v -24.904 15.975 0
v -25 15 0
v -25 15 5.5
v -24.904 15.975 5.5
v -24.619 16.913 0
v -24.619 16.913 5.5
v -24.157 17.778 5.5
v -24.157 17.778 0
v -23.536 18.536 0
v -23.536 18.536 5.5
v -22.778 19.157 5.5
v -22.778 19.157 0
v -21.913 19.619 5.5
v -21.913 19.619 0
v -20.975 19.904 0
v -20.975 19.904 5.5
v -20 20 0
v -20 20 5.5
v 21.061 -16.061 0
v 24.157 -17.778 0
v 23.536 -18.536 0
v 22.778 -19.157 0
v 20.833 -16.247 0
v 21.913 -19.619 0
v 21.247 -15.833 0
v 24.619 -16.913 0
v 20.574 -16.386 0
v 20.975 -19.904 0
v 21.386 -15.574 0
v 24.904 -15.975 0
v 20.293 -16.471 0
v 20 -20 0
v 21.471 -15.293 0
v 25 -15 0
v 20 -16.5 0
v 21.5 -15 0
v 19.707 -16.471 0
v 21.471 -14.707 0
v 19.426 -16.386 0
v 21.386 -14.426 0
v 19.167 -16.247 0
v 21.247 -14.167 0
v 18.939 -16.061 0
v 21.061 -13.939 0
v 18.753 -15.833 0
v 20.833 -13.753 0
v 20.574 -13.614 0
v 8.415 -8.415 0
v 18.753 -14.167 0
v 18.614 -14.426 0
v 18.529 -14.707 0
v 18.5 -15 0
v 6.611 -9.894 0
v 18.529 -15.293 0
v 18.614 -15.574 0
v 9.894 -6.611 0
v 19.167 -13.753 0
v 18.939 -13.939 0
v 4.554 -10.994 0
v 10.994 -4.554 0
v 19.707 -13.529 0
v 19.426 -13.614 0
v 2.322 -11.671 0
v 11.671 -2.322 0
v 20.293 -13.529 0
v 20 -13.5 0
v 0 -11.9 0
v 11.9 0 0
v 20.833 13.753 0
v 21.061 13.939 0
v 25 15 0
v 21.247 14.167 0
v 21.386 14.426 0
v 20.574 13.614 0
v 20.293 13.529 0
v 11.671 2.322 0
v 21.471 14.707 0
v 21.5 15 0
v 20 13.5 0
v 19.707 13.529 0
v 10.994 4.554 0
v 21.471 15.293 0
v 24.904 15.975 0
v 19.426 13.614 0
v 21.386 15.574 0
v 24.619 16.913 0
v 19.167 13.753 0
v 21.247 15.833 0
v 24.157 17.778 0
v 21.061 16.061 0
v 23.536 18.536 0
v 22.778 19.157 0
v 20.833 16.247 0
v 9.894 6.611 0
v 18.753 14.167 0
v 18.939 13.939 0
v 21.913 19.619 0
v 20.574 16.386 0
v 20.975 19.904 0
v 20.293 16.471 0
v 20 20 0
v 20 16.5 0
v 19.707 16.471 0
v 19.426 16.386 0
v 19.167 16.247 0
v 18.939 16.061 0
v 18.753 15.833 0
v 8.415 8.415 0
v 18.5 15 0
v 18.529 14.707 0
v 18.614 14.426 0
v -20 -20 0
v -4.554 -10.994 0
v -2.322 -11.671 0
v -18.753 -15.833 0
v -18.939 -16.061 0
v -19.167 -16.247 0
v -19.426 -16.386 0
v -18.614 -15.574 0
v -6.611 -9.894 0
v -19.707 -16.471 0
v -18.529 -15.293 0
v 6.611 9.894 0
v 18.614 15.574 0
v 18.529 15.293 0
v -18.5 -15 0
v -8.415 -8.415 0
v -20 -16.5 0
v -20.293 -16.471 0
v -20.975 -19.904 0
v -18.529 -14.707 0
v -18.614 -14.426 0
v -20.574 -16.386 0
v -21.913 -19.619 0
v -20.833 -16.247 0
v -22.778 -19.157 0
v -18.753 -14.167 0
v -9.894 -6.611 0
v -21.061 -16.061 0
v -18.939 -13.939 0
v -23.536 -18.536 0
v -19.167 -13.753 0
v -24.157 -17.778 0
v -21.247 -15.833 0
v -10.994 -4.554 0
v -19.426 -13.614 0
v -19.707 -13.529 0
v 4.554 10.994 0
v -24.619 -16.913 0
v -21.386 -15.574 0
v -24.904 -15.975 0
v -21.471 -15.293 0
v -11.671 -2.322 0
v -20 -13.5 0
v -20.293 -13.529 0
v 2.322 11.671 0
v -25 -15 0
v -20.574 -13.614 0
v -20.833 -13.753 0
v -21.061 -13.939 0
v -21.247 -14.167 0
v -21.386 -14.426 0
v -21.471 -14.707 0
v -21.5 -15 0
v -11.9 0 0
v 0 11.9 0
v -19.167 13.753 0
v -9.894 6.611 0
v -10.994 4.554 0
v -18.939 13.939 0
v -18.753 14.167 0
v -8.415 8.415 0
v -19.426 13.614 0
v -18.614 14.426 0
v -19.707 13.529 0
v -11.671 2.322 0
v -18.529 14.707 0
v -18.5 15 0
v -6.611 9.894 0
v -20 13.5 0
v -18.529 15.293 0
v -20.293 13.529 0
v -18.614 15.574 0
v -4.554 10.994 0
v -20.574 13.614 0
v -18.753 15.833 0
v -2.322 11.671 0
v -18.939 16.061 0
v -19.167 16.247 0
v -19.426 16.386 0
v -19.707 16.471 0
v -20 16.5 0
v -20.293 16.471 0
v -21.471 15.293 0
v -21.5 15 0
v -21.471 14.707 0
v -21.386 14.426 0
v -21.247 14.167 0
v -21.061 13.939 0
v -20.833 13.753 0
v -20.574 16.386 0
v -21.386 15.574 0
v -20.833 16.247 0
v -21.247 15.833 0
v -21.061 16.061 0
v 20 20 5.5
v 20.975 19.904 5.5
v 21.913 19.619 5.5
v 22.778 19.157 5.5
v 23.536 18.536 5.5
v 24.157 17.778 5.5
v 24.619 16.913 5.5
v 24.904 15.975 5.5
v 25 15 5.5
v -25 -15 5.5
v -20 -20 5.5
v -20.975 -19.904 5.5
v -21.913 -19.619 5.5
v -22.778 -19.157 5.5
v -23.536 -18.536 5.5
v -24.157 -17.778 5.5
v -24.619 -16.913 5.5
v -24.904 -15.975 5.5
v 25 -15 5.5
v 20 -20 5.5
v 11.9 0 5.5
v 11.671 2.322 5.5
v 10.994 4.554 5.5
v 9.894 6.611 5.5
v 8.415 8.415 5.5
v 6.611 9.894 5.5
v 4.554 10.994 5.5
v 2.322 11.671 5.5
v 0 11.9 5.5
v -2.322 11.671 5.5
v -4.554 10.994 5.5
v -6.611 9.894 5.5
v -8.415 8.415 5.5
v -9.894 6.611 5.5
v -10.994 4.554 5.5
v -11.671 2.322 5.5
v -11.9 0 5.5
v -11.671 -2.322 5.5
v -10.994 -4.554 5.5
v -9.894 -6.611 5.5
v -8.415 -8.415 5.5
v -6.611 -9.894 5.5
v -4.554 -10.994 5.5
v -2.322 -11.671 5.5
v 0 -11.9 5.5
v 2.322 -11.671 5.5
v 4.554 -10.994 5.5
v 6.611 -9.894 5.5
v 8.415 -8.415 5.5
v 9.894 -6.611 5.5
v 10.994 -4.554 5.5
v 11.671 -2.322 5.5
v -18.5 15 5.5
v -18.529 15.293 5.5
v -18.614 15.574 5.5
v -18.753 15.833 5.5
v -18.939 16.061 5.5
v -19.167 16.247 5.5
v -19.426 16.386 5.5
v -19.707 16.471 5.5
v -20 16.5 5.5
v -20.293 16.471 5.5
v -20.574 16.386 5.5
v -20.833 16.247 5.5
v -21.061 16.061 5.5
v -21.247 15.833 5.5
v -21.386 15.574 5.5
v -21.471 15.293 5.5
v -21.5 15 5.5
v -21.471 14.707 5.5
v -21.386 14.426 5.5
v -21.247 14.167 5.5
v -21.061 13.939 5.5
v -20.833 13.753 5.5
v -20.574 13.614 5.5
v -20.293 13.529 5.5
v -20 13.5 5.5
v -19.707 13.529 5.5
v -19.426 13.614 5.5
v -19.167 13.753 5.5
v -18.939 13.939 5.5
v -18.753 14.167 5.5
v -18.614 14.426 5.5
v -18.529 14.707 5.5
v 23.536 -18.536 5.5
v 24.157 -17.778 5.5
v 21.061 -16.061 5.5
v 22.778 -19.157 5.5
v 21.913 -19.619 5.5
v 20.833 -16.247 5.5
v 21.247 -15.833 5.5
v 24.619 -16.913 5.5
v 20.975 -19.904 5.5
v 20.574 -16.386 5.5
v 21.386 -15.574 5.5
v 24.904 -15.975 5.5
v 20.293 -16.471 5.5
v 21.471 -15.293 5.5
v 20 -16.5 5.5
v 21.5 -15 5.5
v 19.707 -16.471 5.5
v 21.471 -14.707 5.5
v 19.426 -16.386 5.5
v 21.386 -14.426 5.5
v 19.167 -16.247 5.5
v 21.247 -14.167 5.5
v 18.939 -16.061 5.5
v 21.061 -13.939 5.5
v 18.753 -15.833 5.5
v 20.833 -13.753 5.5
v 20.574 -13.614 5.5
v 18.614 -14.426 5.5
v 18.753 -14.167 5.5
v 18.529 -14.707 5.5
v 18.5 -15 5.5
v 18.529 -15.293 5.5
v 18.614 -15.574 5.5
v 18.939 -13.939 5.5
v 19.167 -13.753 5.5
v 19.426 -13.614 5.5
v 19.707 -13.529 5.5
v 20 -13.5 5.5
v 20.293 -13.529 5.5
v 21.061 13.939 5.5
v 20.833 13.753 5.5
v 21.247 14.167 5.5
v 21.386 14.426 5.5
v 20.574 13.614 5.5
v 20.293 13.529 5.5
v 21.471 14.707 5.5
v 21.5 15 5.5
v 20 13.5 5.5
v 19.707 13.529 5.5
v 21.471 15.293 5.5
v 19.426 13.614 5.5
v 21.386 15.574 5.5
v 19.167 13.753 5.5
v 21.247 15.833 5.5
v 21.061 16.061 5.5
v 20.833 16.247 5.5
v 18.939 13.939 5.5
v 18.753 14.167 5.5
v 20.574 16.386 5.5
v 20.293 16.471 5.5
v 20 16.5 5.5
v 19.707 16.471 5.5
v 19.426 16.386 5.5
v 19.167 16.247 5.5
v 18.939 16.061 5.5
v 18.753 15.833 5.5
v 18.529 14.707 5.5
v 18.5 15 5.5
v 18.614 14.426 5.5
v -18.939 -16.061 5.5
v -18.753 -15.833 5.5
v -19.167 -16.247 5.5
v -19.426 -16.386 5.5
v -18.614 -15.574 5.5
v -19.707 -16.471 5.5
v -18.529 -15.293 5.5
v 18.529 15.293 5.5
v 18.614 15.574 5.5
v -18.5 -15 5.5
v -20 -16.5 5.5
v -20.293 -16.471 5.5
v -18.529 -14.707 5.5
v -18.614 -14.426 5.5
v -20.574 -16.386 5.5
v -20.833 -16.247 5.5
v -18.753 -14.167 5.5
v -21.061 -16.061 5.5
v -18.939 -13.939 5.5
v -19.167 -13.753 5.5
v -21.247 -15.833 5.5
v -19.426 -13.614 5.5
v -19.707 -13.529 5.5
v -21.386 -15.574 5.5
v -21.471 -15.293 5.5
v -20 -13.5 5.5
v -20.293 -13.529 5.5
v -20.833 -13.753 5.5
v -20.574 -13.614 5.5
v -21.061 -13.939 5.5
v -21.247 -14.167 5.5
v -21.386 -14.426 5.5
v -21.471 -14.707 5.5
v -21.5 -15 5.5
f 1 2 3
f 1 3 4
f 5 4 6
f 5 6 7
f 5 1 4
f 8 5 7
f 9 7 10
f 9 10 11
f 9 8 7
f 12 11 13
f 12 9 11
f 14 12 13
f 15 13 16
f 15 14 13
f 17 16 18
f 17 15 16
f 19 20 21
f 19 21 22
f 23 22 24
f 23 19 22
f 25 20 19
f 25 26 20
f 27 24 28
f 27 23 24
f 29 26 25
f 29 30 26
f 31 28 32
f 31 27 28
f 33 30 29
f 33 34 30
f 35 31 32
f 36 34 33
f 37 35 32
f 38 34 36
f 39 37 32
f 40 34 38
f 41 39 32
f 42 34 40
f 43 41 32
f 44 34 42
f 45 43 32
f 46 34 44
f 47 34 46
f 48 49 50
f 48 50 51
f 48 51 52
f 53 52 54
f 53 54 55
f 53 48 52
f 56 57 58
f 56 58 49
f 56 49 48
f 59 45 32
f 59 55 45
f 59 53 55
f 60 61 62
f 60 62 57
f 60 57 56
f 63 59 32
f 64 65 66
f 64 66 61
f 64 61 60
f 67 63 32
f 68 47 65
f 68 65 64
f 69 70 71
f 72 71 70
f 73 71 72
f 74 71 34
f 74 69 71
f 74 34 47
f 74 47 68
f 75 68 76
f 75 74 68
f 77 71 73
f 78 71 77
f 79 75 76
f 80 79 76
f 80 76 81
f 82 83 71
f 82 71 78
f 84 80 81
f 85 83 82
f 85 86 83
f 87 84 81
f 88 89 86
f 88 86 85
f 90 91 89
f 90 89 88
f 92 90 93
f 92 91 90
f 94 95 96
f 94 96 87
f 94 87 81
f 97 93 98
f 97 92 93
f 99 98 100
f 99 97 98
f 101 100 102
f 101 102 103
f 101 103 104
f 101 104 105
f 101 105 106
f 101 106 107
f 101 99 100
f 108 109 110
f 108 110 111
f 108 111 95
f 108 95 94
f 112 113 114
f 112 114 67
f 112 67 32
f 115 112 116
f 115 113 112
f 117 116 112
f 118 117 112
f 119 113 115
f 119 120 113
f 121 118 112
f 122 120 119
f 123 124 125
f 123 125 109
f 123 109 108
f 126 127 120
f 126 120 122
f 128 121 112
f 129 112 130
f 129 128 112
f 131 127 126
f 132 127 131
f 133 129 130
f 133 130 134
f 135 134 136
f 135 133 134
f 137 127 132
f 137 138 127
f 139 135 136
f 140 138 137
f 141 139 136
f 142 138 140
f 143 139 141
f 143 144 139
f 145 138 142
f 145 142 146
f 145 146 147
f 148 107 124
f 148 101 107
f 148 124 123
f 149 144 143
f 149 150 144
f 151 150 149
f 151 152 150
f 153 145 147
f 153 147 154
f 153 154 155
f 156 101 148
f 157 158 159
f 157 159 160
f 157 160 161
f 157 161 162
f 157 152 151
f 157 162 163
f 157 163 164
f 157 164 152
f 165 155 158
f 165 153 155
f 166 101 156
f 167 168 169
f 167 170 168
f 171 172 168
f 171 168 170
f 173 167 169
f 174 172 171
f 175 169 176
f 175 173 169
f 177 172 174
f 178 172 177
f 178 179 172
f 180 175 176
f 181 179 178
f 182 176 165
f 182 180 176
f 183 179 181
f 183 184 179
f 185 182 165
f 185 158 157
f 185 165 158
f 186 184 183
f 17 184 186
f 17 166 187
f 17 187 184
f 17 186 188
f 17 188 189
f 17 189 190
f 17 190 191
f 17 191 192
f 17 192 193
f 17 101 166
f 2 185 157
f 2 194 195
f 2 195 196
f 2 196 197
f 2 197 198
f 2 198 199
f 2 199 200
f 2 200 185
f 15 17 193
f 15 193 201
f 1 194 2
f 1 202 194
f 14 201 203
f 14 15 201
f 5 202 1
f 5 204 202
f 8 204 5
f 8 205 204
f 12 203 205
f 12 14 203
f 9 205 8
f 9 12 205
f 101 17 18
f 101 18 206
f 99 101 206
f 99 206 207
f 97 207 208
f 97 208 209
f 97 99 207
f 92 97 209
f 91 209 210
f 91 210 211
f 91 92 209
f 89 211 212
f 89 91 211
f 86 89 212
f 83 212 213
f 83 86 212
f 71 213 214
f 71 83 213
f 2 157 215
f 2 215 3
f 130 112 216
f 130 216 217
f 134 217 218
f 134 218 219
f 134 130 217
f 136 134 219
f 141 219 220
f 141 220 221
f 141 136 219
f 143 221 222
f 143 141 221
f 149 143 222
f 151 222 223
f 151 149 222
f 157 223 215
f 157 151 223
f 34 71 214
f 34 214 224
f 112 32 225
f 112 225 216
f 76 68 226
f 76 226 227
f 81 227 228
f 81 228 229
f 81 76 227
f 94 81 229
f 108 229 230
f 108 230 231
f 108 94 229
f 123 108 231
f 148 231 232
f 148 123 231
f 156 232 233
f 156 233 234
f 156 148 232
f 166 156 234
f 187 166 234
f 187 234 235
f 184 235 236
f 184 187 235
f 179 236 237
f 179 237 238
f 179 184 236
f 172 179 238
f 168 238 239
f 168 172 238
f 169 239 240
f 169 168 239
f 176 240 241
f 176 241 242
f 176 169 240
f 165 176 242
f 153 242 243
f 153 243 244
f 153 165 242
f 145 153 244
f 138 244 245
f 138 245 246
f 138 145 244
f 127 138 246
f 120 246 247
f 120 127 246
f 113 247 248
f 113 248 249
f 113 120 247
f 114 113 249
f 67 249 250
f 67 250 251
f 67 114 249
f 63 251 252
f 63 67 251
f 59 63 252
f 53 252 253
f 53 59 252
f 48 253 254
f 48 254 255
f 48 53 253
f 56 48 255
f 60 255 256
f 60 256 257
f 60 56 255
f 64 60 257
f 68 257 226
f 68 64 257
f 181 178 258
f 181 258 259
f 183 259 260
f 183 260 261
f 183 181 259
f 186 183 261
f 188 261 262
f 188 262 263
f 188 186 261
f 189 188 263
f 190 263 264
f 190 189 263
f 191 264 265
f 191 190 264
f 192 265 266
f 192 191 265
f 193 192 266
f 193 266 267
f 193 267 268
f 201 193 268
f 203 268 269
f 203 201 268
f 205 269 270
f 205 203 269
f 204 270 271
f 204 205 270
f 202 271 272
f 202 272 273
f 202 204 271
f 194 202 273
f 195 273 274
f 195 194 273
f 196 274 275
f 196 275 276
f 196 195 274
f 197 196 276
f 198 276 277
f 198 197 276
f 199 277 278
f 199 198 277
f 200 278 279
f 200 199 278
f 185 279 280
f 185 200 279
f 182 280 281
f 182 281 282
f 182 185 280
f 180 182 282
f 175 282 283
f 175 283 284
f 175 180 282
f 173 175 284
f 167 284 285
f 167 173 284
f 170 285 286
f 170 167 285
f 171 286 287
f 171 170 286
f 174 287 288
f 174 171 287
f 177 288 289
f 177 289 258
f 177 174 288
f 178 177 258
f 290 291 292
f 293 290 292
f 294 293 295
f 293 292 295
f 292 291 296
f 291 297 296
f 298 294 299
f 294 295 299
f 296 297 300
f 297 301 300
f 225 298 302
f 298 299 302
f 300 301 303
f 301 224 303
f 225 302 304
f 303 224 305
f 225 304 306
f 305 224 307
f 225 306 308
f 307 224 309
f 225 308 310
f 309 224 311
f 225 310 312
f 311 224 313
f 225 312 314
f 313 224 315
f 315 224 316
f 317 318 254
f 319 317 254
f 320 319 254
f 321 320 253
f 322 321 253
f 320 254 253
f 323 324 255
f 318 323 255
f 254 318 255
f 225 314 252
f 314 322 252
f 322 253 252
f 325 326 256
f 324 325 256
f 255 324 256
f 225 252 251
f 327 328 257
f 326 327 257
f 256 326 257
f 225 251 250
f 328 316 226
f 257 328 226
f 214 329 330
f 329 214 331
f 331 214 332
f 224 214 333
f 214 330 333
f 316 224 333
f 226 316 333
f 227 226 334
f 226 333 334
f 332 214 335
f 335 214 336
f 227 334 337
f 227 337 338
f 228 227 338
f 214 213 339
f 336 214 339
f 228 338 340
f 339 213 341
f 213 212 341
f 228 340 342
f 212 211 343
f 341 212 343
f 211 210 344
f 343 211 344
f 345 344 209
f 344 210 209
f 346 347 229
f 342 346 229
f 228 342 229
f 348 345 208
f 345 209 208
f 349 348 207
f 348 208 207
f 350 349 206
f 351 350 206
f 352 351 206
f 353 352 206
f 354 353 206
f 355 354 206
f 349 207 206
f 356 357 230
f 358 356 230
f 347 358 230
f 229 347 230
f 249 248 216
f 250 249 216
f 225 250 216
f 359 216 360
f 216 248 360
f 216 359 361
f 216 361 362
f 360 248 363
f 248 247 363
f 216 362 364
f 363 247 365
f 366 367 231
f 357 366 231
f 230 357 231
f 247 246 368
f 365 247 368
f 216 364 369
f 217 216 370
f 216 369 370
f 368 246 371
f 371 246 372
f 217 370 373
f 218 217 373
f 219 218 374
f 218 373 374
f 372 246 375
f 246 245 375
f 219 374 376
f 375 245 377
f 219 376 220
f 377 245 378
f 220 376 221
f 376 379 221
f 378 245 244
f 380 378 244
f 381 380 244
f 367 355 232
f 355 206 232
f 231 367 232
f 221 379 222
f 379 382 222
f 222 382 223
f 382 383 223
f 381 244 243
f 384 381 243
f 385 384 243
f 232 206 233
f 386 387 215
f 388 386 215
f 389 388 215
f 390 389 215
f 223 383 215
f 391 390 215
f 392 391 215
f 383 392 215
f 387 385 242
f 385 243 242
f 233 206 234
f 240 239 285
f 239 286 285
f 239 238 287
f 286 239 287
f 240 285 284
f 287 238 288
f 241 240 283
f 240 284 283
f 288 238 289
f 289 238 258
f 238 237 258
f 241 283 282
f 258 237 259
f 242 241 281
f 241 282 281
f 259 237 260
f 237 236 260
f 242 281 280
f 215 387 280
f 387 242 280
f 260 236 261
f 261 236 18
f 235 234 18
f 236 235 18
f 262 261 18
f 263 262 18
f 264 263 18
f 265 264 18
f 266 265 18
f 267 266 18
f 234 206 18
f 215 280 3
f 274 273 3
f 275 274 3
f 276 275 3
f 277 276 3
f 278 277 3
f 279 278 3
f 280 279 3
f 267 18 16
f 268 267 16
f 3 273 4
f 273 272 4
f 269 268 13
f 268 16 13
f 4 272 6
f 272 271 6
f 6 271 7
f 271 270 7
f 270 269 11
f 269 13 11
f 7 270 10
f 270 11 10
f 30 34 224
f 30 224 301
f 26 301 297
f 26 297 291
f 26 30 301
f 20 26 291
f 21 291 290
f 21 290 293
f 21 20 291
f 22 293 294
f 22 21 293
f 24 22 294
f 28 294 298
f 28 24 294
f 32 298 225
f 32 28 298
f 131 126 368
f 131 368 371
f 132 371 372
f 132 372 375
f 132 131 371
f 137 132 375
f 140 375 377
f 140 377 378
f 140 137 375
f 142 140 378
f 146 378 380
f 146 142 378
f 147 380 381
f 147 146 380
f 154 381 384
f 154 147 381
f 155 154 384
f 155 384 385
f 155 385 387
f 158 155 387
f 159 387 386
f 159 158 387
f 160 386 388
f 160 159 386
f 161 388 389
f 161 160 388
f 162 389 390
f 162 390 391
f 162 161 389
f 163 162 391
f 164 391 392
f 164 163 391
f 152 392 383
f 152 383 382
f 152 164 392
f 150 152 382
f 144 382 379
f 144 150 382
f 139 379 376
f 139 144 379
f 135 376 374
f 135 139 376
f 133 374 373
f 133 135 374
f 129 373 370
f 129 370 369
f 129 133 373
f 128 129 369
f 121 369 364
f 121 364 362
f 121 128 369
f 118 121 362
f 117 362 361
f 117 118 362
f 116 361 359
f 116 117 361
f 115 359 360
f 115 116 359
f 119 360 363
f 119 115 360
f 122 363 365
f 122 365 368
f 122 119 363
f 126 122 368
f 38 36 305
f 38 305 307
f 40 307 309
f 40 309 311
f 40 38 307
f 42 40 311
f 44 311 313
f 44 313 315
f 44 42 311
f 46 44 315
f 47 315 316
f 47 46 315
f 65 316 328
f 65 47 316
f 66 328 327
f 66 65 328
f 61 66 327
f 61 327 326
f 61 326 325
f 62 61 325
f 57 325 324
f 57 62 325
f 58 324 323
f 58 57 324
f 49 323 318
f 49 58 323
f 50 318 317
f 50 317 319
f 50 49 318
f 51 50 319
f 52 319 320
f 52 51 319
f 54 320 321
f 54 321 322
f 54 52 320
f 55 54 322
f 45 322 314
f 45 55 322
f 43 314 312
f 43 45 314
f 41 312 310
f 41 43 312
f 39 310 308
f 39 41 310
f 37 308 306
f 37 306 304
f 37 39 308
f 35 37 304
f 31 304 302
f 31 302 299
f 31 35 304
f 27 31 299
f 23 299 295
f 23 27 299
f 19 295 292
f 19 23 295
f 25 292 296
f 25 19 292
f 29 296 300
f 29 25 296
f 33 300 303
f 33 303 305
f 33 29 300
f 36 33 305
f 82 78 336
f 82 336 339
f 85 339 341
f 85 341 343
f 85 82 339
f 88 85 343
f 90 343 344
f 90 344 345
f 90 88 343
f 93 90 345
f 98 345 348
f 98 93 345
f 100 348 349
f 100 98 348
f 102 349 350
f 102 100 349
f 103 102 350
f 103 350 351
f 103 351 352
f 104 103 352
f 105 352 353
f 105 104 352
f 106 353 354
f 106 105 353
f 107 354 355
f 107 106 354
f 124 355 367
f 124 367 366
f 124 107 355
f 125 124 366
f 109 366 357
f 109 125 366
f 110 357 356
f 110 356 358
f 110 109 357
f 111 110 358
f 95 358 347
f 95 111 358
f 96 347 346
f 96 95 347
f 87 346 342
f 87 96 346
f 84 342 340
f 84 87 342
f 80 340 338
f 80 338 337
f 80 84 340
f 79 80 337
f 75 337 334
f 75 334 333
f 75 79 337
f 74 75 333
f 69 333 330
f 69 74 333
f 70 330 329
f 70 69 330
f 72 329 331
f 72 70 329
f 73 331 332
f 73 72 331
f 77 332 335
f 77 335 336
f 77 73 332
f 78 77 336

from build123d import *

# Parameters (mm, degrees)
CROQUIS1_R              = 1.5
CROQUIS1_R_2            = 11.9
SALIENTE_EXTRUIR1_DEPTH = 5.5


with BuildPart() as part:
    # Croquis1 → Saliente-Extruir1 (new body)
    with BuildSketch(Plane.XY):
        with BuildLine():
            Line((-20, 20), (20, 20))
            ThreePointArc((20, 20), (23.535533906, 18.535533906), (25, 15))
            Line((25, 15), (25, -15))
            ThreePointArc((25, -15), (23.535533906, -18.535533906), (20, -20))
            Line((20, -20), (-20, -20))
            ThreePointArc((-20, -20), (-23.535533906, -18.535533906), (-25, -15))
            Line((-25, -15), (-25, 15))
            ThreePointArc((-25, 15), (-23.535533906, 18.535533906), (-20, 20))
        make_face()
        with Locations((-20, 15)):
            Circle(CROQUIS1_R, mode=Mode.SUBTRACT)
        Circle(CROQUIS1_R_2, mode=Mode.SUBTRACT)
        with Locations((-20, -15)):
            Circle(CROQUIS1_R, mode=Mode.SUBTRACT)
        with Locations((20, -15)):
            Circle(CROQUIS1_R, mode=Mode.SUBTRACT)
        with Locations((20, 15)):
            Circle(CROQUIS1_R, mode=Mode.SUBTRACT)
    extrude(amount=SALIENTE_EXTRUIR1_DEPTH)


solid = part.part
